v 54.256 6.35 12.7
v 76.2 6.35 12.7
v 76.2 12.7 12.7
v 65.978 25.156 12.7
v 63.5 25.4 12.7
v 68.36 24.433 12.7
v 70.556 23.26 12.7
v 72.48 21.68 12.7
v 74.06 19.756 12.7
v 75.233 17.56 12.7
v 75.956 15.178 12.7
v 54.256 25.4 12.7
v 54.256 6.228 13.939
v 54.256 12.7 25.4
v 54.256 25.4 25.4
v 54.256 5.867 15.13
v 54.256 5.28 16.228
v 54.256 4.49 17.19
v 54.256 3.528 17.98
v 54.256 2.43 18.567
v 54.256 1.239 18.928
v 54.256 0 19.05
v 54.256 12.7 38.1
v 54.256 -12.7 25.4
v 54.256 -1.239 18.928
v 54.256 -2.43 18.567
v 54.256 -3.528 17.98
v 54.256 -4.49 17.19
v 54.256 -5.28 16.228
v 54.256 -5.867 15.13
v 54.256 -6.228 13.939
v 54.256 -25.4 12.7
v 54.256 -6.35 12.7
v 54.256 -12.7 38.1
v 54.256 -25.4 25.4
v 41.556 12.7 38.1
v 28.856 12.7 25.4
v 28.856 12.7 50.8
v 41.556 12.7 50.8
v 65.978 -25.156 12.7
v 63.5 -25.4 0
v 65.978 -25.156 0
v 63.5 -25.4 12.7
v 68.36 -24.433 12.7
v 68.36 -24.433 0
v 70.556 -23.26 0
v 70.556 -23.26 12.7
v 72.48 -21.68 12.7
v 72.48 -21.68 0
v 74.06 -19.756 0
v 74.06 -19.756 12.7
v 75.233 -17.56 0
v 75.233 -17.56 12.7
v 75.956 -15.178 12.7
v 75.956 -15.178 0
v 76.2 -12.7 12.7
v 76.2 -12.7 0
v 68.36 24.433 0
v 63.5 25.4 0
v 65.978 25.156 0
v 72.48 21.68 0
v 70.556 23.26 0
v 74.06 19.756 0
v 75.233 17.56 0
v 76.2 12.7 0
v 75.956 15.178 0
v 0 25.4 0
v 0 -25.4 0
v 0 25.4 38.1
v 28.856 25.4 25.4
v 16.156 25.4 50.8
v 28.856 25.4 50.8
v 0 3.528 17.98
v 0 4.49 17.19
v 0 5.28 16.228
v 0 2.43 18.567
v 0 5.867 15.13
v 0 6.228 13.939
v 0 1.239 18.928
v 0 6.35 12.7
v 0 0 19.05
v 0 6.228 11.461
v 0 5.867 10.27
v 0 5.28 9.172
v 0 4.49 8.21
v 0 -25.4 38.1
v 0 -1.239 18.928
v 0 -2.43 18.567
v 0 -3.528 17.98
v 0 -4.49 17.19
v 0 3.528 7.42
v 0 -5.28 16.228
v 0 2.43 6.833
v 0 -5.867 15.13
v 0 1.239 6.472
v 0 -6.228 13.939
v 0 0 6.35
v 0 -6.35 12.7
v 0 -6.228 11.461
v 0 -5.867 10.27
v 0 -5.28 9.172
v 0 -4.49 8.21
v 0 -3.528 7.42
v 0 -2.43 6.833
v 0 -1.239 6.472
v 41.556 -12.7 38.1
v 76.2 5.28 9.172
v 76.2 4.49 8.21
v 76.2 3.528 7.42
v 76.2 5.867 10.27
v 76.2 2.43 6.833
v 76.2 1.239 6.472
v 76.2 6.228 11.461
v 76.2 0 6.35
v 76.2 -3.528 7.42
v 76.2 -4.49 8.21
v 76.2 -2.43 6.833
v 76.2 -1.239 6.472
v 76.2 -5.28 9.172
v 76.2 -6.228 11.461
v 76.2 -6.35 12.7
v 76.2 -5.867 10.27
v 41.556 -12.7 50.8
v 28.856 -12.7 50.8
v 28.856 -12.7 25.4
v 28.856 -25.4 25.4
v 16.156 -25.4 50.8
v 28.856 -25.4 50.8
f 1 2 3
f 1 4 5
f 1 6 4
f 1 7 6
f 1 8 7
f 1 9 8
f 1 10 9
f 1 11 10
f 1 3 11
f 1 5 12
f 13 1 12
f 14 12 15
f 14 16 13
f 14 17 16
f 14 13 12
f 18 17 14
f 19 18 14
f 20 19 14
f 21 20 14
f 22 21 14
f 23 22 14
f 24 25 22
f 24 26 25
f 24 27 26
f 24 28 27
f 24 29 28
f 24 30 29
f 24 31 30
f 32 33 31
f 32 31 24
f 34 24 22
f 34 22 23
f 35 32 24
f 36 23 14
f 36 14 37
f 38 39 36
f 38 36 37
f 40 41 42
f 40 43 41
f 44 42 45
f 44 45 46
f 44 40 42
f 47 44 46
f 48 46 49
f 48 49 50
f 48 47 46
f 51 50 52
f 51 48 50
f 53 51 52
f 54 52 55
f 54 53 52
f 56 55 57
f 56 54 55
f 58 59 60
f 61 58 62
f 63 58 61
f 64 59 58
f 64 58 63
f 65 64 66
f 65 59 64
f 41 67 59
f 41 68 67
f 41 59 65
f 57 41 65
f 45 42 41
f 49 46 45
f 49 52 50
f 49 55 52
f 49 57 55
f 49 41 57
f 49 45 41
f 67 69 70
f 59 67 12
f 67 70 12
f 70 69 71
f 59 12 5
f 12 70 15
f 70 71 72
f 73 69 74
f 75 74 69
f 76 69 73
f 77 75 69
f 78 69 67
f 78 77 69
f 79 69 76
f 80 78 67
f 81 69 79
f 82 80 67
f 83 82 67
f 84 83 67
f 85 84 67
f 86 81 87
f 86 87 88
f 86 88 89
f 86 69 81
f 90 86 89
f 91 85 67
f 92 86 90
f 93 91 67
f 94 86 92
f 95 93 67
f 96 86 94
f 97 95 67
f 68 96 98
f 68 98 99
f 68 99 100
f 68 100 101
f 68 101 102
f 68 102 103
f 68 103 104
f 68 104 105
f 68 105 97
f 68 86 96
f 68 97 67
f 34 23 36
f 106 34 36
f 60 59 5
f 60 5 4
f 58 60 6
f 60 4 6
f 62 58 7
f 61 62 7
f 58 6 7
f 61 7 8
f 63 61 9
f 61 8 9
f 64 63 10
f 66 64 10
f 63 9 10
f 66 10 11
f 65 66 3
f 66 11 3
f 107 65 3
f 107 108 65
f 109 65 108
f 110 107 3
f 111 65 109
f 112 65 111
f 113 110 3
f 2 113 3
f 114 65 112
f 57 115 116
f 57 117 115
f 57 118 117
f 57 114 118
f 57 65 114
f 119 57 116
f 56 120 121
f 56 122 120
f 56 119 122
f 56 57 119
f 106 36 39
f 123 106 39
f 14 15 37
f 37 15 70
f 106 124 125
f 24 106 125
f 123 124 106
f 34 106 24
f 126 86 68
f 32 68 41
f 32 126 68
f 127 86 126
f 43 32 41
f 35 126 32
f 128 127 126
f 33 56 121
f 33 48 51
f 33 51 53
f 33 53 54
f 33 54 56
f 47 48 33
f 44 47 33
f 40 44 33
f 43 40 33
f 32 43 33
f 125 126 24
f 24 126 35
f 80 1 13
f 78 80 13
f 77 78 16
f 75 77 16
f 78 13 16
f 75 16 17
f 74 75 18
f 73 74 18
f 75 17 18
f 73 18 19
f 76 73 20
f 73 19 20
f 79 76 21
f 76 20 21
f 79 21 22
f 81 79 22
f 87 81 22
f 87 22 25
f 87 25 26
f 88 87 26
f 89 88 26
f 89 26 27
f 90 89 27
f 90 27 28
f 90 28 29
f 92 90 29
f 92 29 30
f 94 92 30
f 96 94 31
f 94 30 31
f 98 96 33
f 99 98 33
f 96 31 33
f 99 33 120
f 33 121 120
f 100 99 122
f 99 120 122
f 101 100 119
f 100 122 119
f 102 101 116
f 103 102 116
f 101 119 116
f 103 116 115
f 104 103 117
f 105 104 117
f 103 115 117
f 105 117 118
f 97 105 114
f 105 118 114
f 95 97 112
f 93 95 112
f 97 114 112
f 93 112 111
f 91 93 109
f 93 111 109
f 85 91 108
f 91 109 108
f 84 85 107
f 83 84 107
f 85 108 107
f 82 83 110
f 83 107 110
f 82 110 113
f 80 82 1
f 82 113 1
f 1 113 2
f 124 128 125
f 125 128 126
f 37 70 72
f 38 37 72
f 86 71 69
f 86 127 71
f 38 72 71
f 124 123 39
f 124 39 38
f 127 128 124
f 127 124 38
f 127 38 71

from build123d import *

# Parameters (mm, degrees)
F1_DEPTH = 25.4
F2_R     = 6.35
F3_DEPTH = 54.256924135
F5_DEPTH = 76.201
F7_DEPTH = 12.7
F9_DEPTH = 12.7
F10_R    = 12.7


with BuildPart() as f1:
    # F0 (on Front) → F1 (new body, symmetric)
    with BuildSketch(Plane.XZ):
        Polygon((0, 38.1), (0, 0), (76.2, 0), (76.2, 12.7), (54.255924135, 12.7), (54.255924135, 38.1), (41.555924135, 38.1), (41.555924135, 50.8), (16.155924135, 50.8), align=None)
    extrude(amount=F1_DEPTH, both=True)

    # F2 (on face) → F3 (cut, through all)
    with BuildSketch(Plane.YZ.offset(54.255924135)):
        with Locations((0, 12.7)):
            Circle(F2_R)
    extrude(amount=-F3_DEPTH, mode=Mode.SUBTRACT)

    # F4 (on face) → F5 (cut, through all)
    with BuildSketch(Plane.YZ.offset(76.2)):
        with BuildLine():
            ThreePointArc((-6.35, 12.7), (0, 6.35), (6.35, 12.7))
            Line((6.35, 12.7), (-6.35, 12.7))
        make_face()
    extrude(amount=-F5_DEPTH, mode=Mode.SUBTRACT)

    # F6 (on face) → F7 (cut)
    with BuildSketch(Plane.XZ.offset(25.4)):
        Polygon((41.555924135, 50.8), (28.855924135, 50.8), (28.855924135, 25.4), (54.255924135, 25.4), (54.255924135, 38.1), (41.555924135, 38.1), align=None)
    extrude(amount=-F7_DEPTH, mode=Mode.SUBTRACT)

    # F8 (on face) → F9 (cut)
    with BuildSketch(Plane(origin=(0, 25.4, 0), x_dir=(-1, 0, 0), z_dir=(0, 1, 0))):
        Polygon((-28.855924135, 25.4), (-28.855924135, 50.8), (-41.555924135, 50.8), (-41.555924135, 38.1), (-54.255924135, 38.1), (-54.255924135, 25.4), align=None)
    extrude(amount=-F9_DEPTH, mode=Mode.SUBTRACT)

    # F10
    f10_edges = [f1.edges().sort_by_distance(p)[0] for p in [
        (76.2, 25.4, 6.35),
        (76.2, -25.4, 6.35),
    ]]
    fillet(f10_edges, radius=F10_R)


solid = f1.part
